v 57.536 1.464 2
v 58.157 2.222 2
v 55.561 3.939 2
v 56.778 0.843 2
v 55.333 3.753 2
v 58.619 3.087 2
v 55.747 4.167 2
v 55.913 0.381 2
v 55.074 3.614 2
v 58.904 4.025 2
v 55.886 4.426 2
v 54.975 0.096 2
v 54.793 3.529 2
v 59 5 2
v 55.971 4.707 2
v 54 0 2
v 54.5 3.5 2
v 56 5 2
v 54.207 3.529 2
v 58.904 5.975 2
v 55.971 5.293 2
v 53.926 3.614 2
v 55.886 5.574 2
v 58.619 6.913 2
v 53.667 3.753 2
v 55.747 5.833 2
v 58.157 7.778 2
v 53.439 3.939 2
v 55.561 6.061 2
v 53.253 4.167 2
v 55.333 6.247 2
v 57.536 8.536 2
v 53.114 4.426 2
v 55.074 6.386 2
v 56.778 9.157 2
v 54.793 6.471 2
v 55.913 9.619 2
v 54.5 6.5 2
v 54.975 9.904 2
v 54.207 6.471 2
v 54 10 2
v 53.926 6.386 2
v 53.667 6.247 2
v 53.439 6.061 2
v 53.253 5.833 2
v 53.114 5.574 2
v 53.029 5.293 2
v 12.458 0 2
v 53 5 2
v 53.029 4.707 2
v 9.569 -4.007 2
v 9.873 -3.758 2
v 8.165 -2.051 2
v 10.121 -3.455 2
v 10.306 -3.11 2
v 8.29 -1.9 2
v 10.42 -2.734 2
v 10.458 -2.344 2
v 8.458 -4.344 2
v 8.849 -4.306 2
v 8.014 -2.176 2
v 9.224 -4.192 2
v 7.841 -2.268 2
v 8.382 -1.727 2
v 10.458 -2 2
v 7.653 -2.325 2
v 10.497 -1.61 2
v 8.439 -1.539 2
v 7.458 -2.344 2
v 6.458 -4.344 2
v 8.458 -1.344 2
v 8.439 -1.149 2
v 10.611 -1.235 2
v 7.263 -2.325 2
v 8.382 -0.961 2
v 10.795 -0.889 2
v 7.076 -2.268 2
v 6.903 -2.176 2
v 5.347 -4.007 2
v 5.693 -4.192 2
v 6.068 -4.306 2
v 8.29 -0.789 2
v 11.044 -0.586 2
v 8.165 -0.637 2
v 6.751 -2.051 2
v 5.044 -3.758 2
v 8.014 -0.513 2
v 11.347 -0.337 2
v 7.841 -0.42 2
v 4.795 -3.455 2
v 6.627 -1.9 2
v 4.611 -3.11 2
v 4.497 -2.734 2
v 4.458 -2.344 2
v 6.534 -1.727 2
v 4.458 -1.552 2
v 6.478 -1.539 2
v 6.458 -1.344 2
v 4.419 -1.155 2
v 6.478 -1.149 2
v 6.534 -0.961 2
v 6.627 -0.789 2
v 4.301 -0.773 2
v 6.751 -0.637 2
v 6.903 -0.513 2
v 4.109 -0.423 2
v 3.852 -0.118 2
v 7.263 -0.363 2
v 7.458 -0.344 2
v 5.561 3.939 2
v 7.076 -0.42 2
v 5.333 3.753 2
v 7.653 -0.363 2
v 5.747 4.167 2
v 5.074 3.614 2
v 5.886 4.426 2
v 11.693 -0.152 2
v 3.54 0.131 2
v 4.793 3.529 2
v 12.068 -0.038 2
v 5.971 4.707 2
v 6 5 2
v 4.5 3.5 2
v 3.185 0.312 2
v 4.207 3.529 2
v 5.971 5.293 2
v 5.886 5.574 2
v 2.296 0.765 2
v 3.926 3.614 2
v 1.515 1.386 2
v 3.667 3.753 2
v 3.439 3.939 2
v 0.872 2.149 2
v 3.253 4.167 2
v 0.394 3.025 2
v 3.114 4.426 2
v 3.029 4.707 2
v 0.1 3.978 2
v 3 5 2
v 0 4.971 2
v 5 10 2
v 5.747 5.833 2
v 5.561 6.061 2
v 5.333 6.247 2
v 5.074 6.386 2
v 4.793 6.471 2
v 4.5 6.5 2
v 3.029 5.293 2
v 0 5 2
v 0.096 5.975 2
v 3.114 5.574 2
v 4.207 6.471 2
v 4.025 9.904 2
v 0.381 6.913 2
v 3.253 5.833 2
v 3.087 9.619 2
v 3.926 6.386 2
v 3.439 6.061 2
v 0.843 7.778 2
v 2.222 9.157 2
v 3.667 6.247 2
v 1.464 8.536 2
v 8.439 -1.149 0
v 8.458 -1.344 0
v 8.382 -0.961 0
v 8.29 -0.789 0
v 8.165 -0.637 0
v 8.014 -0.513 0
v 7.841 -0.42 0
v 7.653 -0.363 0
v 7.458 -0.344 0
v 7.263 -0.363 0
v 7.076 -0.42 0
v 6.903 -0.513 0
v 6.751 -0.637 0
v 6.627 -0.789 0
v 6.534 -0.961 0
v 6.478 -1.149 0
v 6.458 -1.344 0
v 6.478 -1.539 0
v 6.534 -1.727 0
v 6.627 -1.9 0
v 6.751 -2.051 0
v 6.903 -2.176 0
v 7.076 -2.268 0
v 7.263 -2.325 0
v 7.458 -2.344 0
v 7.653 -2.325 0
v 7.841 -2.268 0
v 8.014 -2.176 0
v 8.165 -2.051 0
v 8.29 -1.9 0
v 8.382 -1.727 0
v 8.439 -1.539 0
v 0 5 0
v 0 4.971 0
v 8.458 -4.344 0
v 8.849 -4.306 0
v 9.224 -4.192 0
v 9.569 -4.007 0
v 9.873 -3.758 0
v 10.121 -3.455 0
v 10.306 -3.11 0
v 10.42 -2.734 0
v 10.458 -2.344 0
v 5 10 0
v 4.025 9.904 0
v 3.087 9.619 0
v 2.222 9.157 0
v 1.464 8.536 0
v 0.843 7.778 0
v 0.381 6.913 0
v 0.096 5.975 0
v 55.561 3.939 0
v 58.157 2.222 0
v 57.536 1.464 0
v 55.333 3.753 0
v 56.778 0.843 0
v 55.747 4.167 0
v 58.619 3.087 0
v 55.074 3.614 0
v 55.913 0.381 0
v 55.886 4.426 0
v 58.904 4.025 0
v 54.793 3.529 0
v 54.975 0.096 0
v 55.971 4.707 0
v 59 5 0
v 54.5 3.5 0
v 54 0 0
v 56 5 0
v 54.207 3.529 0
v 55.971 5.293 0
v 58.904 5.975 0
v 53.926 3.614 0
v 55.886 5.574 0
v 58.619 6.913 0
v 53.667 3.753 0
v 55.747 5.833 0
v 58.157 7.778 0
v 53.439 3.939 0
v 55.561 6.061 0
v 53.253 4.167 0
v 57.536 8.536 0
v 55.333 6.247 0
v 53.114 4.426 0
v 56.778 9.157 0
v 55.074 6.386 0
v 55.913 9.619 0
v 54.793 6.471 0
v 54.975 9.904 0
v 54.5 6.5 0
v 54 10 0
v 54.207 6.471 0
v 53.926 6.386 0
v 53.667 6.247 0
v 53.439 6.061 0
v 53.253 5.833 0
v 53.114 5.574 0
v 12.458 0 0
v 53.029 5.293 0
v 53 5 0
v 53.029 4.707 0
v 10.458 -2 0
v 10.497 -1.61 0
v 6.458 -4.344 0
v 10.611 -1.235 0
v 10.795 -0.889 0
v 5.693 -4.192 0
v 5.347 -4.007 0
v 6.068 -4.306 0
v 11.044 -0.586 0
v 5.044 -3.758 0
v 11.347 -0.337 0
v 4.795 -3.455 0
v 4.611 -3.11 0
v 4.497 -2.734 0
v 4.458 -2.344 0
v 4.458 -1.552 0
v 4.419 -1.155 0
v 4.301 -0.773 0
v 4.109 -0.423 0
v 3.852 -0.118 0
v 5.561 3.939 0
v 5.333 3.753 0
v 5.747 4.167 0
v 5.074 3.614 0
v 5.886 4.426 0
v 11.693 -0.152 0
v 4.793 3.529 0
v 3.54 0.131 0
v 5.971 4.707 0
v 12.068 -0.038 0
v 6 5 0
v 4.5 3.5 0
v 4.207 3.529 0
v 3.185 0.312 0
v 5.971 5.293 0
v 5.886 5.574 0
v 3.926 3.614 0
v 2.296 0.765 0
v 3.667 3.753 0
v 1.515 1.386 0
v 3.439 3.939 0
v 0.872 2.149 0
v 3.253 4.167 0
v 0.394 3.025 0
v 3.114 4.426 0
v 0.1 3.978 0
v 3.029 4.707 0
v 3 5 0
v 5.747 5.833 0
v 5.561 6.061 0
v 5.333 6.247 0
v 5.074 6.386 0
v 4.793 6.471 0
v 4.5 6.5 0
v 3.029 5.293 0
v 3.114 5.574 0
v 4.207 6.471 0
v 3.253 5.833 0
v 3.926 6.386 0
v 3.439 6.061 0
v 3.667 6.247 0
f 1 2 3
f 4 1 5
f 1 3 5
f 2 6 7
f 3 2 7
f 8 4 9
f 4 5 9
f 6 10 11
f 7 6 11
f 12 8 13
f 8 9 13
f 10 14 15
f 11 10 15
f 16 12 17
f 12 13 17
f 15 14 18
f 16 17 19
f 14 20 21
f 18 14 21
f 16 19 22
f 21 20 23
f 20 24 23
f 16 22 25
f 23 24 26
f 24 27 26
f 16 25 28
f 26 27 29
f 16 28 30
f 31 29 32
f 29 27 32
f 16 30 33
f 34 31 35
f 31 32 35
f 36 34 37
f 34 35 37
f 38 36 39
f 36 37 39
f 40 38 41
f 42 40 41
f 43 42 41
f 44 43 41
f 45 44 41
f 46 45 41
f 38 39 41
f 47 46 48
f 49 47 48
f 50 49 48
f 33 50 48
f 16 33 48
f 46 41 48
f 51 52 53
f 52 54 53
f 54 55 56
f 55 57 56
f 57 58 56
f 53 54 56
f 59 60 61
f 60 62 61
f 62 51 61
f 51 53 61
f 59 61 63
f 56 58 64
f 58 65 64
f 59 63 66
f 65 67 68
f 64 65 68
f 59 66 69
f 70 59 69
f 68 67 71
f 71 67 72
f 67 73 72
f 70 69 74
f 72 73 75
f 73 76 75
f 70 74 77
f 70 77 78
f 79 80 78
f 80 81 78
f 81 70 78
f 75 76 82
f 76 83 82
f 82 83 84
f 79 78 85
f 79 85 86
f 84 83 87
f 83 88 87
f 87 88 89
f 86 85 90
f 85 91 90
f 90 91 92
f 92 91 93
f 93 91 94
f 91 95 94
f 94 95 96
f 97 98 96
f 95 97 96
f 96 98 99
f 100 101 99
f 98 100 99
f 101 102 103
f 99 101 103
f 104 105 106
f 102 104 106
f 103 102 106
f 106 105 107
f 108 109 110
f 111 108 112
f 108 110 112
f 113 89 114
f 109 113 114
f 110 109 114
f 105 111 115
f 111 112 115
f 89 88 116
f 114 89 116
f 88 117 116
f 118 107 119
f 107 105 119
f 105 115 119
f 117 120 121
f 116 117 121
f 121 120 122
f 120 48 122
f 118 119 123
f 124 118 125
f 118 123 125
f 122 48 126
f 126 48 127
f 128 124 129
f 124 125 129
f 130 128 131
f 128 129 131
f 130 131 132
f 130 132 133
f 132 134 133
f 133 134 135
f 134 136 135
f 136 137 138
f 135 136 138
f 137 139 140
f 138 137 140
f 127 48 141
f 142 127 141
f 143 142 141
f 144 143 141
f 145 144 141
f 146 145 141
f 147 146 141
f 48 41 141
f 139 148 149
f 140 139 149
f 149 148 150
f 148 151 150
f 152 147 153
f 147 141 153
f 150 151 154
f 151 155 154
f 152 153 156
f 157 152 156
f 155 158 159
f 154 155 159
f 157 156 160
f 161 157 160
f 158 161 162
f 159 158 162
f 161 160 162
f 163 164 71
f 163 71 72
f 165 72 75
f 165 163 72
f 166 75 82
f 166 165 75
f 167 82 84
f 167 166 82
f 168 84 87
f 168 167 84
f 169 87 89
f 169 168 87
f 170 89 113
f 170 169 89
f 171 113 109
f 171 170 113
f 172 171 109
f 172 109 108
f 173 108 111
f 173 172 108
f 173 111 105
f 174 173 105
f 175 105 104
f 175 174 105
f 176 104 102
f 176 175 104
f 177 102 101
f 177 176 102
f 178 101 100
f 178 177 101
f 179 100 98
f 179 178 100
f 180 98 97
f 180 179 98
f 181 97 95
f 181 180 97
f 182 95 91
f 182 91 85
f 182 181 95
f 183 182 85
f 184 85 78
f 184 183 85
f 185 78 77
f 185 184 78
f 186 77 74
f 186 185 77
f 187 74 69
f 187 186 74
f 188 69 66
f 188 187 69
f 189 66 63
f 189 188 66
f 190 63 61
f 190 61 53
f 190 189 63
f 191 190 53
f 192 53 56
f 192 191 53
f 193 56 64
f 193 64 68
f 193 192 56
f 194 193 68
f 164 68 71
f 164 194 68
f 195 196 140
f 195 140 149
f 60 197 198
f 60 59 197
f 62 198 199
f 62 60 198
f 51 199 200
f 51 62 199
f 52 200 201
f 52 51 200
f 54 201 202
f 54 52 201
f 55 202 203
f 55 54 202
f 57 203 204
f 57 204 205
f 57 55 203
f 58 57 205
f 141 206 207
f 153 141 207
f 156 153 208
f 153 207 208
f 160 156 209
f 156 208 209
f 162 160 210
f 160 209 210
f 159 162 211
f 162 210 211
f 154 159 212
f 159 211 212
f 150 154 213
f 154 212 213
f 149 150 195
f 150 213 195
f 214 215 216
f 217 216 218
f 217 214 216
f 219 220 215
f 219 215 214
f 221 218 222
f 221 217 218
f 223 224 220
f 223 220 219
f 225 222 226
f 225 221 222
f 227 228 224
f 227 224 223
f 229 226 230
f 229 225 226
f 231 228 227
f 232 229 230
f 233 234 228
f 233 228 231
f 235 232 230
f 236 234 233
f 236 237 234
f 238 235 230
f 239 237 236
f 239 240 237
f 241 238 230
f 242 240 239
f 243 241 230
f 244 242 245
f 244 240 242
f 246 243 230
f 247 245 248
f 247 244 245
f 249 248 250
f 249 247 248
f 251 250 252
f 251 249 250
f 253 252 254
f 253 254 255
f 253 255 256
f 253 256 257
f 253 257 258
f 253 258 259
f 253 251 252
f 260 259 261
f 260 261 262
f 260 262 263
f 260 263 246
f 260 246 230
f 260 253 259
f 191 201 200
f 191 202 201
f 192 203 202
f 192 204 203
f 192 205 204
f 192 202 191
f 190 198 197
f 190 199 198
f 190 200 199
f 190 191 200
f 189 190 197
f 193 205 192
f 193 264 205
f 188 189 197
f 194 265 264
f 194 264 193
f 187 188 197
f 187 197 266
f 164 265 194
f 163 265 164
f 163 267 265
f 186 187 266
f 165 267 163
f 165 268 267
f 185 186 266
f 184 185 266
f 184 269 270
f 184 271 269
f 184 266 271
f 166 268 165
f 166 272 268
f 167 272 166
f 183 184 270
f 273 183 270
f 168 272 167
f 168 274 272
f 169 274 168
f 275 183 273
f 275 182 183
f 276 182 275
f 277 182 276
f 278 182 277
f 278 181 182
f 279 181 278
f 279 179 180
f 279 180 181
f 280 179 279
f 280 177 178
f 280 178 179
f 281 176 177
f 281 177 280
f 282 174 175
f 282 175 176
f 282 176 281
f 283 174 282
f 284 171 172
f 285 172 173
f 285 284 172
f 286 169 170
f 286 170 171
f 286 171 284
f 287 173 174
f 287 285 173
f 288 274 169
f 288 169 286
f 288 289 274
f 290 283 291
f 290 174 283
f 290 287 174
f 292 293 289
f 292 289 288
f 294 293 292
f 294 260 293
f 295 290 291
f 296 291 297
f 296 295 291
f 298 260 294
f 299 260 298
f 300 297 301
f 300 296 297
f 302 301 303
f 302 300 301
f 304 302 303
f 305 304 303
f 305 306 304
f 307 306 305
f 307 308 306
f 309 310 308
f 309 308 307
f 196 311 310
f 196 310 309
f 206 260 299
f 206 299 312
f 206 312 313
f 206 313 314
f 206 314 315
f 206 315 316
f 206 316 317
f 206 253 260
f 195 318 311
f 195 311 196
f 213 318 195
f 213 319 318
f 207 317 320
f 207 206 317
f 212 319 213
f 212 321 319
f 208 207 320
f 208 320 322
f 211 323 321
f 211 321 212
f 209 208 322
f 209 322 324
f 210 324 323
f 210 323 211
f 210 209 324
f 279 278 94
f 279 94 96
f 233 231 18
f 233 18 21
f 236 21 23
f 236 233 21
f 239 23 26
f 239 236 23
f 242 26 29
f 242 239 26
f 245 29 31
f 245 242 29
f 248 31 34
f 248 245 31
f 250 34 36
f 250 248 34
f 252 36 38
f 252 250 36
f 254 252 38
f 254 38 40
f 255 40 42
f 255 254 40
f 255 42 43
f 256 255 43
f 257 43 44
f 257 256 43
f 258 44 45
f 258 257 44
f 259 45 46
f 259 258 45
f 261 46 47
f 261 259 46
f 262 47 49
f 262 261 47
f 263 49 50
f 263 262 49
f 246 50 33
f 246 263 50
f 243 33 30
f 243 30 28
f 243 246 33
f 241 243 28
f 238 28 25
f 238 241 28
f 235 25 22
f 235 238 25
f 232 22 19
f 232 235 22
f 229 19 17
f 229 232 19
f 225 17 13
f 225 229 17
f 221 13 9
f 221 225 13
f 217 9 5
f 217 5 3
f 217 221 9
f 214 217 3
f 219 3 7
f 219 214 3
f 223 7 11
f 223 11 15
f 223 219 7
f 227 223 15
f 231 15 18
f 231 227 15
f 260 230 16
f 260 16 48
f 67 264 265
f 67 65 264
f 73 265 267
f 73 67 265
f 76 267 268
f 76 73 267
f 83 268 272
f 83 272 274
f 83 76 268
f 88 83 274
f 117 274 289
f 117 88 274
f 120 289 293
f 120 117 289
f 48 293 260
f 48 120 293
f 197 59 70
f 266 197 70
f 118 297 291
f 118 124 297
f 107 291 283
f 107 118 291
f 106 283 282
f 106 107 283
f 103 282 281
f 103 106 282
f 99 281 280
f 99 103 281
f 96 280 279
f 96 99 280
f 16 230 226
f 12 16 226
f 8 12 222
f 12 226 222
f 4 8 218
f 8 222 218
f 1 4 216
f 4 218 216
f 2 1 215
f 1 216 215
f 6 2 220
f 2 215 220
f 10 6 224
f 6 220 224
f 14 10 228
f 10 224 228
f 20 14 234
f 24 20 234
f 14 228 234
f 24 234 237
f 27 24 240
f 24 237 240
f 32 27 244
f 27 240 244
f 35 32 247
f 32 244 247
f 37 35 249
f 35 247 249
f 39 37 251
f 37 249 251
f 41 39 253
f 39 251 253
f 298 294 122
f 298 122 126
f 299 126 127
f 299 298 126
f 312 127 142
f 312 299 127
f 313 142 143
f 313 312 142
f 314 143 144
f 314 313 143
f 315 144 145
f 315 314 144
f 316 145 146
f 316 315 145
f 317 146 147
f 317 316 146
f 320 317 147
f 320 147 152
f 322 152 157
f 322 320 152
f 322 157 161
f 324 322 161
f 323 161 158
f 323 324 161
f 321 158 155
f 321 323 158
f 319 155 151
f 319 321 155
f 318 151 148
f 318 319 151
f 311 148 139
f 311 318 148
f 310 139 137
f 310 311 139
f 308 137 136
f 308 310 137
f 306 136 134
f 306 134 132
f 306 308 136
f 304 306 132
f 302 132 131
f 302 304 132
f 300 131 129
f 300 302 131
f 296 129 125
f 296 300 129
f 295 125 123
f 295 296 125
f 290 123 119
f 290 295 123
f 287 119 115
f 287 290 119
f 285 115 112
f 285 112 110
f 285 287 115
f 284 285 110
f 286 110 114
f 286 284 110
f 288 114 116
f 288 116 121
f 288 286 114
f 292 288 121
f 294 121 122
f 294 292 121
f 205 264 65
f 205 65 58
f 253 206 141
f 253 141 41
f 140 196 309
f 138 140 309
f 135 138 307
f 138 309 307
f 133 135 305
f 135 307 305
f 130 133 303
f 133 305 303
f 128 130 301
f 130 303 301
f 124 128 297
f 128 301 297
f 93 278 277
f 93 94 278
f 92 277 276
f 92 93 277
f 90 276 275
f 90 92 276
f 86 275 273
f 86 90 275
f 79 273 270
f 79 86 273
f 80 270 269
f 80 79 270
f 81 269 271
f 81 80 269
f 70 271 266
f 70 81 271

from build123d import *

# Parameters (mm, degrees)
SKETCH1_R           = 1.5
SKETCH1_R_2         = 1
BOSS_EXTRUDE1_DEPTH = 2
FILLET2_R           = 5
FILLET3_R           = 2


with BuildPart() as part:
    # Sketch1 → Boss-Extrude1 (new body)
    with BuildSketch(Plane.XY):
        Polygon((0, 0), (0, 10), (59, 10), (59, 0), (10.458327832, 0), (10.458327832, -4.344154509), (4.458327832, -4.344154509), (4.458327832, 0), align=None)
        with Locations((4.5, 5)):
            Circle(SKETCH1_R, mode=Mode.SUBTRACT)
        with Locations((54.5, 5)):
            Circle(SKETCH1_R, mode=Mode.SUBTRACT)
        with Locations((7.458327832, -1.344154509)):
            Circle(SKETCH1_R_2, mode=Mode.SUBTRACT)
    extrude(amount=BOSS_EXTRUDE1_DEPTH)

    # Fillet2
    # the kernel refuses this fillet: 5 mm, written as the material it takes off along each edge
    with BuildSketch(Plane(origin=(59, 0, -12.5), x_dir=(0, 1, 0), z_dir=(0, 0, 1)), Plane(origin=(59, 10, -12.5), x_dir=(-1, 0, 0), z_dir=(0, 0, 1)), Plane(origin=(0, 10, -12.5), x_dir=(0, -1, 0), z_dir=(0, 0, 1))) as fillet2_piece_1:
        with BuildLine():
            CenterArc((FILLET2_R, FILLET2_R), FILLET2_R, 180, 90)
            Line((0, FILLET2_R), (-FILLET2_R * 0.02, FILLET2_R))
            Line((-FILLET2_R * 0.02, FILLET2_R), (-FILLET2_R * 0.02, -FILLET2_R * 0.02))
            Line((-FILLET2_R * 0.02, -FILLET2_R * 0.02), (FILLET2_R, -FILLET2_R * 0.02))
            Line((FILLET2_R, -FILLET2_R * 0.02), (FILLET2_R, 0))
        make_face()
    extrude(amount=27, mode=Mode.SUBTRACT)
    with BuildSketch(Plane(origin=(0, 0, -12.426431322), x_dir=(0, 1, 0), z_dir=(0, 0, 1))) as fillet2_piece_2:
        with BuildLine():
            CenterArc((4.970572529, -5), FILLET2_R, 90, 83.780688145)
            Line((0, -4.458327832), (-0.099411451, -4.447494389))
            ThreePointArc((-0.099411451, -4.447494389), (-0.1, -2.229163916), (-0.1, 0))
            Line((-0.1, 0), (0, 0.1))
            Line((0, 0.1), (4.970572529, 0.1))
            Line((4.970572529, 0.1), (4.970572529, 0))
        make_face()
    extrude(amount=26.852862643, mode=Mode.SUBTRACT)

    # Fillet3
    fillet3_edges = [part.edges().sort_by_distance(p)[0] for p in [
        (10.458327832, 0, 1),
        (10.458327832, -4.344154509, 1),
        (4.458327832, -4.344154509, 1),
        (4.458327832, 0, 1),
    ]]
    fillet(fillet3_edges, radius=FILLET3_R)


solid = part.part
